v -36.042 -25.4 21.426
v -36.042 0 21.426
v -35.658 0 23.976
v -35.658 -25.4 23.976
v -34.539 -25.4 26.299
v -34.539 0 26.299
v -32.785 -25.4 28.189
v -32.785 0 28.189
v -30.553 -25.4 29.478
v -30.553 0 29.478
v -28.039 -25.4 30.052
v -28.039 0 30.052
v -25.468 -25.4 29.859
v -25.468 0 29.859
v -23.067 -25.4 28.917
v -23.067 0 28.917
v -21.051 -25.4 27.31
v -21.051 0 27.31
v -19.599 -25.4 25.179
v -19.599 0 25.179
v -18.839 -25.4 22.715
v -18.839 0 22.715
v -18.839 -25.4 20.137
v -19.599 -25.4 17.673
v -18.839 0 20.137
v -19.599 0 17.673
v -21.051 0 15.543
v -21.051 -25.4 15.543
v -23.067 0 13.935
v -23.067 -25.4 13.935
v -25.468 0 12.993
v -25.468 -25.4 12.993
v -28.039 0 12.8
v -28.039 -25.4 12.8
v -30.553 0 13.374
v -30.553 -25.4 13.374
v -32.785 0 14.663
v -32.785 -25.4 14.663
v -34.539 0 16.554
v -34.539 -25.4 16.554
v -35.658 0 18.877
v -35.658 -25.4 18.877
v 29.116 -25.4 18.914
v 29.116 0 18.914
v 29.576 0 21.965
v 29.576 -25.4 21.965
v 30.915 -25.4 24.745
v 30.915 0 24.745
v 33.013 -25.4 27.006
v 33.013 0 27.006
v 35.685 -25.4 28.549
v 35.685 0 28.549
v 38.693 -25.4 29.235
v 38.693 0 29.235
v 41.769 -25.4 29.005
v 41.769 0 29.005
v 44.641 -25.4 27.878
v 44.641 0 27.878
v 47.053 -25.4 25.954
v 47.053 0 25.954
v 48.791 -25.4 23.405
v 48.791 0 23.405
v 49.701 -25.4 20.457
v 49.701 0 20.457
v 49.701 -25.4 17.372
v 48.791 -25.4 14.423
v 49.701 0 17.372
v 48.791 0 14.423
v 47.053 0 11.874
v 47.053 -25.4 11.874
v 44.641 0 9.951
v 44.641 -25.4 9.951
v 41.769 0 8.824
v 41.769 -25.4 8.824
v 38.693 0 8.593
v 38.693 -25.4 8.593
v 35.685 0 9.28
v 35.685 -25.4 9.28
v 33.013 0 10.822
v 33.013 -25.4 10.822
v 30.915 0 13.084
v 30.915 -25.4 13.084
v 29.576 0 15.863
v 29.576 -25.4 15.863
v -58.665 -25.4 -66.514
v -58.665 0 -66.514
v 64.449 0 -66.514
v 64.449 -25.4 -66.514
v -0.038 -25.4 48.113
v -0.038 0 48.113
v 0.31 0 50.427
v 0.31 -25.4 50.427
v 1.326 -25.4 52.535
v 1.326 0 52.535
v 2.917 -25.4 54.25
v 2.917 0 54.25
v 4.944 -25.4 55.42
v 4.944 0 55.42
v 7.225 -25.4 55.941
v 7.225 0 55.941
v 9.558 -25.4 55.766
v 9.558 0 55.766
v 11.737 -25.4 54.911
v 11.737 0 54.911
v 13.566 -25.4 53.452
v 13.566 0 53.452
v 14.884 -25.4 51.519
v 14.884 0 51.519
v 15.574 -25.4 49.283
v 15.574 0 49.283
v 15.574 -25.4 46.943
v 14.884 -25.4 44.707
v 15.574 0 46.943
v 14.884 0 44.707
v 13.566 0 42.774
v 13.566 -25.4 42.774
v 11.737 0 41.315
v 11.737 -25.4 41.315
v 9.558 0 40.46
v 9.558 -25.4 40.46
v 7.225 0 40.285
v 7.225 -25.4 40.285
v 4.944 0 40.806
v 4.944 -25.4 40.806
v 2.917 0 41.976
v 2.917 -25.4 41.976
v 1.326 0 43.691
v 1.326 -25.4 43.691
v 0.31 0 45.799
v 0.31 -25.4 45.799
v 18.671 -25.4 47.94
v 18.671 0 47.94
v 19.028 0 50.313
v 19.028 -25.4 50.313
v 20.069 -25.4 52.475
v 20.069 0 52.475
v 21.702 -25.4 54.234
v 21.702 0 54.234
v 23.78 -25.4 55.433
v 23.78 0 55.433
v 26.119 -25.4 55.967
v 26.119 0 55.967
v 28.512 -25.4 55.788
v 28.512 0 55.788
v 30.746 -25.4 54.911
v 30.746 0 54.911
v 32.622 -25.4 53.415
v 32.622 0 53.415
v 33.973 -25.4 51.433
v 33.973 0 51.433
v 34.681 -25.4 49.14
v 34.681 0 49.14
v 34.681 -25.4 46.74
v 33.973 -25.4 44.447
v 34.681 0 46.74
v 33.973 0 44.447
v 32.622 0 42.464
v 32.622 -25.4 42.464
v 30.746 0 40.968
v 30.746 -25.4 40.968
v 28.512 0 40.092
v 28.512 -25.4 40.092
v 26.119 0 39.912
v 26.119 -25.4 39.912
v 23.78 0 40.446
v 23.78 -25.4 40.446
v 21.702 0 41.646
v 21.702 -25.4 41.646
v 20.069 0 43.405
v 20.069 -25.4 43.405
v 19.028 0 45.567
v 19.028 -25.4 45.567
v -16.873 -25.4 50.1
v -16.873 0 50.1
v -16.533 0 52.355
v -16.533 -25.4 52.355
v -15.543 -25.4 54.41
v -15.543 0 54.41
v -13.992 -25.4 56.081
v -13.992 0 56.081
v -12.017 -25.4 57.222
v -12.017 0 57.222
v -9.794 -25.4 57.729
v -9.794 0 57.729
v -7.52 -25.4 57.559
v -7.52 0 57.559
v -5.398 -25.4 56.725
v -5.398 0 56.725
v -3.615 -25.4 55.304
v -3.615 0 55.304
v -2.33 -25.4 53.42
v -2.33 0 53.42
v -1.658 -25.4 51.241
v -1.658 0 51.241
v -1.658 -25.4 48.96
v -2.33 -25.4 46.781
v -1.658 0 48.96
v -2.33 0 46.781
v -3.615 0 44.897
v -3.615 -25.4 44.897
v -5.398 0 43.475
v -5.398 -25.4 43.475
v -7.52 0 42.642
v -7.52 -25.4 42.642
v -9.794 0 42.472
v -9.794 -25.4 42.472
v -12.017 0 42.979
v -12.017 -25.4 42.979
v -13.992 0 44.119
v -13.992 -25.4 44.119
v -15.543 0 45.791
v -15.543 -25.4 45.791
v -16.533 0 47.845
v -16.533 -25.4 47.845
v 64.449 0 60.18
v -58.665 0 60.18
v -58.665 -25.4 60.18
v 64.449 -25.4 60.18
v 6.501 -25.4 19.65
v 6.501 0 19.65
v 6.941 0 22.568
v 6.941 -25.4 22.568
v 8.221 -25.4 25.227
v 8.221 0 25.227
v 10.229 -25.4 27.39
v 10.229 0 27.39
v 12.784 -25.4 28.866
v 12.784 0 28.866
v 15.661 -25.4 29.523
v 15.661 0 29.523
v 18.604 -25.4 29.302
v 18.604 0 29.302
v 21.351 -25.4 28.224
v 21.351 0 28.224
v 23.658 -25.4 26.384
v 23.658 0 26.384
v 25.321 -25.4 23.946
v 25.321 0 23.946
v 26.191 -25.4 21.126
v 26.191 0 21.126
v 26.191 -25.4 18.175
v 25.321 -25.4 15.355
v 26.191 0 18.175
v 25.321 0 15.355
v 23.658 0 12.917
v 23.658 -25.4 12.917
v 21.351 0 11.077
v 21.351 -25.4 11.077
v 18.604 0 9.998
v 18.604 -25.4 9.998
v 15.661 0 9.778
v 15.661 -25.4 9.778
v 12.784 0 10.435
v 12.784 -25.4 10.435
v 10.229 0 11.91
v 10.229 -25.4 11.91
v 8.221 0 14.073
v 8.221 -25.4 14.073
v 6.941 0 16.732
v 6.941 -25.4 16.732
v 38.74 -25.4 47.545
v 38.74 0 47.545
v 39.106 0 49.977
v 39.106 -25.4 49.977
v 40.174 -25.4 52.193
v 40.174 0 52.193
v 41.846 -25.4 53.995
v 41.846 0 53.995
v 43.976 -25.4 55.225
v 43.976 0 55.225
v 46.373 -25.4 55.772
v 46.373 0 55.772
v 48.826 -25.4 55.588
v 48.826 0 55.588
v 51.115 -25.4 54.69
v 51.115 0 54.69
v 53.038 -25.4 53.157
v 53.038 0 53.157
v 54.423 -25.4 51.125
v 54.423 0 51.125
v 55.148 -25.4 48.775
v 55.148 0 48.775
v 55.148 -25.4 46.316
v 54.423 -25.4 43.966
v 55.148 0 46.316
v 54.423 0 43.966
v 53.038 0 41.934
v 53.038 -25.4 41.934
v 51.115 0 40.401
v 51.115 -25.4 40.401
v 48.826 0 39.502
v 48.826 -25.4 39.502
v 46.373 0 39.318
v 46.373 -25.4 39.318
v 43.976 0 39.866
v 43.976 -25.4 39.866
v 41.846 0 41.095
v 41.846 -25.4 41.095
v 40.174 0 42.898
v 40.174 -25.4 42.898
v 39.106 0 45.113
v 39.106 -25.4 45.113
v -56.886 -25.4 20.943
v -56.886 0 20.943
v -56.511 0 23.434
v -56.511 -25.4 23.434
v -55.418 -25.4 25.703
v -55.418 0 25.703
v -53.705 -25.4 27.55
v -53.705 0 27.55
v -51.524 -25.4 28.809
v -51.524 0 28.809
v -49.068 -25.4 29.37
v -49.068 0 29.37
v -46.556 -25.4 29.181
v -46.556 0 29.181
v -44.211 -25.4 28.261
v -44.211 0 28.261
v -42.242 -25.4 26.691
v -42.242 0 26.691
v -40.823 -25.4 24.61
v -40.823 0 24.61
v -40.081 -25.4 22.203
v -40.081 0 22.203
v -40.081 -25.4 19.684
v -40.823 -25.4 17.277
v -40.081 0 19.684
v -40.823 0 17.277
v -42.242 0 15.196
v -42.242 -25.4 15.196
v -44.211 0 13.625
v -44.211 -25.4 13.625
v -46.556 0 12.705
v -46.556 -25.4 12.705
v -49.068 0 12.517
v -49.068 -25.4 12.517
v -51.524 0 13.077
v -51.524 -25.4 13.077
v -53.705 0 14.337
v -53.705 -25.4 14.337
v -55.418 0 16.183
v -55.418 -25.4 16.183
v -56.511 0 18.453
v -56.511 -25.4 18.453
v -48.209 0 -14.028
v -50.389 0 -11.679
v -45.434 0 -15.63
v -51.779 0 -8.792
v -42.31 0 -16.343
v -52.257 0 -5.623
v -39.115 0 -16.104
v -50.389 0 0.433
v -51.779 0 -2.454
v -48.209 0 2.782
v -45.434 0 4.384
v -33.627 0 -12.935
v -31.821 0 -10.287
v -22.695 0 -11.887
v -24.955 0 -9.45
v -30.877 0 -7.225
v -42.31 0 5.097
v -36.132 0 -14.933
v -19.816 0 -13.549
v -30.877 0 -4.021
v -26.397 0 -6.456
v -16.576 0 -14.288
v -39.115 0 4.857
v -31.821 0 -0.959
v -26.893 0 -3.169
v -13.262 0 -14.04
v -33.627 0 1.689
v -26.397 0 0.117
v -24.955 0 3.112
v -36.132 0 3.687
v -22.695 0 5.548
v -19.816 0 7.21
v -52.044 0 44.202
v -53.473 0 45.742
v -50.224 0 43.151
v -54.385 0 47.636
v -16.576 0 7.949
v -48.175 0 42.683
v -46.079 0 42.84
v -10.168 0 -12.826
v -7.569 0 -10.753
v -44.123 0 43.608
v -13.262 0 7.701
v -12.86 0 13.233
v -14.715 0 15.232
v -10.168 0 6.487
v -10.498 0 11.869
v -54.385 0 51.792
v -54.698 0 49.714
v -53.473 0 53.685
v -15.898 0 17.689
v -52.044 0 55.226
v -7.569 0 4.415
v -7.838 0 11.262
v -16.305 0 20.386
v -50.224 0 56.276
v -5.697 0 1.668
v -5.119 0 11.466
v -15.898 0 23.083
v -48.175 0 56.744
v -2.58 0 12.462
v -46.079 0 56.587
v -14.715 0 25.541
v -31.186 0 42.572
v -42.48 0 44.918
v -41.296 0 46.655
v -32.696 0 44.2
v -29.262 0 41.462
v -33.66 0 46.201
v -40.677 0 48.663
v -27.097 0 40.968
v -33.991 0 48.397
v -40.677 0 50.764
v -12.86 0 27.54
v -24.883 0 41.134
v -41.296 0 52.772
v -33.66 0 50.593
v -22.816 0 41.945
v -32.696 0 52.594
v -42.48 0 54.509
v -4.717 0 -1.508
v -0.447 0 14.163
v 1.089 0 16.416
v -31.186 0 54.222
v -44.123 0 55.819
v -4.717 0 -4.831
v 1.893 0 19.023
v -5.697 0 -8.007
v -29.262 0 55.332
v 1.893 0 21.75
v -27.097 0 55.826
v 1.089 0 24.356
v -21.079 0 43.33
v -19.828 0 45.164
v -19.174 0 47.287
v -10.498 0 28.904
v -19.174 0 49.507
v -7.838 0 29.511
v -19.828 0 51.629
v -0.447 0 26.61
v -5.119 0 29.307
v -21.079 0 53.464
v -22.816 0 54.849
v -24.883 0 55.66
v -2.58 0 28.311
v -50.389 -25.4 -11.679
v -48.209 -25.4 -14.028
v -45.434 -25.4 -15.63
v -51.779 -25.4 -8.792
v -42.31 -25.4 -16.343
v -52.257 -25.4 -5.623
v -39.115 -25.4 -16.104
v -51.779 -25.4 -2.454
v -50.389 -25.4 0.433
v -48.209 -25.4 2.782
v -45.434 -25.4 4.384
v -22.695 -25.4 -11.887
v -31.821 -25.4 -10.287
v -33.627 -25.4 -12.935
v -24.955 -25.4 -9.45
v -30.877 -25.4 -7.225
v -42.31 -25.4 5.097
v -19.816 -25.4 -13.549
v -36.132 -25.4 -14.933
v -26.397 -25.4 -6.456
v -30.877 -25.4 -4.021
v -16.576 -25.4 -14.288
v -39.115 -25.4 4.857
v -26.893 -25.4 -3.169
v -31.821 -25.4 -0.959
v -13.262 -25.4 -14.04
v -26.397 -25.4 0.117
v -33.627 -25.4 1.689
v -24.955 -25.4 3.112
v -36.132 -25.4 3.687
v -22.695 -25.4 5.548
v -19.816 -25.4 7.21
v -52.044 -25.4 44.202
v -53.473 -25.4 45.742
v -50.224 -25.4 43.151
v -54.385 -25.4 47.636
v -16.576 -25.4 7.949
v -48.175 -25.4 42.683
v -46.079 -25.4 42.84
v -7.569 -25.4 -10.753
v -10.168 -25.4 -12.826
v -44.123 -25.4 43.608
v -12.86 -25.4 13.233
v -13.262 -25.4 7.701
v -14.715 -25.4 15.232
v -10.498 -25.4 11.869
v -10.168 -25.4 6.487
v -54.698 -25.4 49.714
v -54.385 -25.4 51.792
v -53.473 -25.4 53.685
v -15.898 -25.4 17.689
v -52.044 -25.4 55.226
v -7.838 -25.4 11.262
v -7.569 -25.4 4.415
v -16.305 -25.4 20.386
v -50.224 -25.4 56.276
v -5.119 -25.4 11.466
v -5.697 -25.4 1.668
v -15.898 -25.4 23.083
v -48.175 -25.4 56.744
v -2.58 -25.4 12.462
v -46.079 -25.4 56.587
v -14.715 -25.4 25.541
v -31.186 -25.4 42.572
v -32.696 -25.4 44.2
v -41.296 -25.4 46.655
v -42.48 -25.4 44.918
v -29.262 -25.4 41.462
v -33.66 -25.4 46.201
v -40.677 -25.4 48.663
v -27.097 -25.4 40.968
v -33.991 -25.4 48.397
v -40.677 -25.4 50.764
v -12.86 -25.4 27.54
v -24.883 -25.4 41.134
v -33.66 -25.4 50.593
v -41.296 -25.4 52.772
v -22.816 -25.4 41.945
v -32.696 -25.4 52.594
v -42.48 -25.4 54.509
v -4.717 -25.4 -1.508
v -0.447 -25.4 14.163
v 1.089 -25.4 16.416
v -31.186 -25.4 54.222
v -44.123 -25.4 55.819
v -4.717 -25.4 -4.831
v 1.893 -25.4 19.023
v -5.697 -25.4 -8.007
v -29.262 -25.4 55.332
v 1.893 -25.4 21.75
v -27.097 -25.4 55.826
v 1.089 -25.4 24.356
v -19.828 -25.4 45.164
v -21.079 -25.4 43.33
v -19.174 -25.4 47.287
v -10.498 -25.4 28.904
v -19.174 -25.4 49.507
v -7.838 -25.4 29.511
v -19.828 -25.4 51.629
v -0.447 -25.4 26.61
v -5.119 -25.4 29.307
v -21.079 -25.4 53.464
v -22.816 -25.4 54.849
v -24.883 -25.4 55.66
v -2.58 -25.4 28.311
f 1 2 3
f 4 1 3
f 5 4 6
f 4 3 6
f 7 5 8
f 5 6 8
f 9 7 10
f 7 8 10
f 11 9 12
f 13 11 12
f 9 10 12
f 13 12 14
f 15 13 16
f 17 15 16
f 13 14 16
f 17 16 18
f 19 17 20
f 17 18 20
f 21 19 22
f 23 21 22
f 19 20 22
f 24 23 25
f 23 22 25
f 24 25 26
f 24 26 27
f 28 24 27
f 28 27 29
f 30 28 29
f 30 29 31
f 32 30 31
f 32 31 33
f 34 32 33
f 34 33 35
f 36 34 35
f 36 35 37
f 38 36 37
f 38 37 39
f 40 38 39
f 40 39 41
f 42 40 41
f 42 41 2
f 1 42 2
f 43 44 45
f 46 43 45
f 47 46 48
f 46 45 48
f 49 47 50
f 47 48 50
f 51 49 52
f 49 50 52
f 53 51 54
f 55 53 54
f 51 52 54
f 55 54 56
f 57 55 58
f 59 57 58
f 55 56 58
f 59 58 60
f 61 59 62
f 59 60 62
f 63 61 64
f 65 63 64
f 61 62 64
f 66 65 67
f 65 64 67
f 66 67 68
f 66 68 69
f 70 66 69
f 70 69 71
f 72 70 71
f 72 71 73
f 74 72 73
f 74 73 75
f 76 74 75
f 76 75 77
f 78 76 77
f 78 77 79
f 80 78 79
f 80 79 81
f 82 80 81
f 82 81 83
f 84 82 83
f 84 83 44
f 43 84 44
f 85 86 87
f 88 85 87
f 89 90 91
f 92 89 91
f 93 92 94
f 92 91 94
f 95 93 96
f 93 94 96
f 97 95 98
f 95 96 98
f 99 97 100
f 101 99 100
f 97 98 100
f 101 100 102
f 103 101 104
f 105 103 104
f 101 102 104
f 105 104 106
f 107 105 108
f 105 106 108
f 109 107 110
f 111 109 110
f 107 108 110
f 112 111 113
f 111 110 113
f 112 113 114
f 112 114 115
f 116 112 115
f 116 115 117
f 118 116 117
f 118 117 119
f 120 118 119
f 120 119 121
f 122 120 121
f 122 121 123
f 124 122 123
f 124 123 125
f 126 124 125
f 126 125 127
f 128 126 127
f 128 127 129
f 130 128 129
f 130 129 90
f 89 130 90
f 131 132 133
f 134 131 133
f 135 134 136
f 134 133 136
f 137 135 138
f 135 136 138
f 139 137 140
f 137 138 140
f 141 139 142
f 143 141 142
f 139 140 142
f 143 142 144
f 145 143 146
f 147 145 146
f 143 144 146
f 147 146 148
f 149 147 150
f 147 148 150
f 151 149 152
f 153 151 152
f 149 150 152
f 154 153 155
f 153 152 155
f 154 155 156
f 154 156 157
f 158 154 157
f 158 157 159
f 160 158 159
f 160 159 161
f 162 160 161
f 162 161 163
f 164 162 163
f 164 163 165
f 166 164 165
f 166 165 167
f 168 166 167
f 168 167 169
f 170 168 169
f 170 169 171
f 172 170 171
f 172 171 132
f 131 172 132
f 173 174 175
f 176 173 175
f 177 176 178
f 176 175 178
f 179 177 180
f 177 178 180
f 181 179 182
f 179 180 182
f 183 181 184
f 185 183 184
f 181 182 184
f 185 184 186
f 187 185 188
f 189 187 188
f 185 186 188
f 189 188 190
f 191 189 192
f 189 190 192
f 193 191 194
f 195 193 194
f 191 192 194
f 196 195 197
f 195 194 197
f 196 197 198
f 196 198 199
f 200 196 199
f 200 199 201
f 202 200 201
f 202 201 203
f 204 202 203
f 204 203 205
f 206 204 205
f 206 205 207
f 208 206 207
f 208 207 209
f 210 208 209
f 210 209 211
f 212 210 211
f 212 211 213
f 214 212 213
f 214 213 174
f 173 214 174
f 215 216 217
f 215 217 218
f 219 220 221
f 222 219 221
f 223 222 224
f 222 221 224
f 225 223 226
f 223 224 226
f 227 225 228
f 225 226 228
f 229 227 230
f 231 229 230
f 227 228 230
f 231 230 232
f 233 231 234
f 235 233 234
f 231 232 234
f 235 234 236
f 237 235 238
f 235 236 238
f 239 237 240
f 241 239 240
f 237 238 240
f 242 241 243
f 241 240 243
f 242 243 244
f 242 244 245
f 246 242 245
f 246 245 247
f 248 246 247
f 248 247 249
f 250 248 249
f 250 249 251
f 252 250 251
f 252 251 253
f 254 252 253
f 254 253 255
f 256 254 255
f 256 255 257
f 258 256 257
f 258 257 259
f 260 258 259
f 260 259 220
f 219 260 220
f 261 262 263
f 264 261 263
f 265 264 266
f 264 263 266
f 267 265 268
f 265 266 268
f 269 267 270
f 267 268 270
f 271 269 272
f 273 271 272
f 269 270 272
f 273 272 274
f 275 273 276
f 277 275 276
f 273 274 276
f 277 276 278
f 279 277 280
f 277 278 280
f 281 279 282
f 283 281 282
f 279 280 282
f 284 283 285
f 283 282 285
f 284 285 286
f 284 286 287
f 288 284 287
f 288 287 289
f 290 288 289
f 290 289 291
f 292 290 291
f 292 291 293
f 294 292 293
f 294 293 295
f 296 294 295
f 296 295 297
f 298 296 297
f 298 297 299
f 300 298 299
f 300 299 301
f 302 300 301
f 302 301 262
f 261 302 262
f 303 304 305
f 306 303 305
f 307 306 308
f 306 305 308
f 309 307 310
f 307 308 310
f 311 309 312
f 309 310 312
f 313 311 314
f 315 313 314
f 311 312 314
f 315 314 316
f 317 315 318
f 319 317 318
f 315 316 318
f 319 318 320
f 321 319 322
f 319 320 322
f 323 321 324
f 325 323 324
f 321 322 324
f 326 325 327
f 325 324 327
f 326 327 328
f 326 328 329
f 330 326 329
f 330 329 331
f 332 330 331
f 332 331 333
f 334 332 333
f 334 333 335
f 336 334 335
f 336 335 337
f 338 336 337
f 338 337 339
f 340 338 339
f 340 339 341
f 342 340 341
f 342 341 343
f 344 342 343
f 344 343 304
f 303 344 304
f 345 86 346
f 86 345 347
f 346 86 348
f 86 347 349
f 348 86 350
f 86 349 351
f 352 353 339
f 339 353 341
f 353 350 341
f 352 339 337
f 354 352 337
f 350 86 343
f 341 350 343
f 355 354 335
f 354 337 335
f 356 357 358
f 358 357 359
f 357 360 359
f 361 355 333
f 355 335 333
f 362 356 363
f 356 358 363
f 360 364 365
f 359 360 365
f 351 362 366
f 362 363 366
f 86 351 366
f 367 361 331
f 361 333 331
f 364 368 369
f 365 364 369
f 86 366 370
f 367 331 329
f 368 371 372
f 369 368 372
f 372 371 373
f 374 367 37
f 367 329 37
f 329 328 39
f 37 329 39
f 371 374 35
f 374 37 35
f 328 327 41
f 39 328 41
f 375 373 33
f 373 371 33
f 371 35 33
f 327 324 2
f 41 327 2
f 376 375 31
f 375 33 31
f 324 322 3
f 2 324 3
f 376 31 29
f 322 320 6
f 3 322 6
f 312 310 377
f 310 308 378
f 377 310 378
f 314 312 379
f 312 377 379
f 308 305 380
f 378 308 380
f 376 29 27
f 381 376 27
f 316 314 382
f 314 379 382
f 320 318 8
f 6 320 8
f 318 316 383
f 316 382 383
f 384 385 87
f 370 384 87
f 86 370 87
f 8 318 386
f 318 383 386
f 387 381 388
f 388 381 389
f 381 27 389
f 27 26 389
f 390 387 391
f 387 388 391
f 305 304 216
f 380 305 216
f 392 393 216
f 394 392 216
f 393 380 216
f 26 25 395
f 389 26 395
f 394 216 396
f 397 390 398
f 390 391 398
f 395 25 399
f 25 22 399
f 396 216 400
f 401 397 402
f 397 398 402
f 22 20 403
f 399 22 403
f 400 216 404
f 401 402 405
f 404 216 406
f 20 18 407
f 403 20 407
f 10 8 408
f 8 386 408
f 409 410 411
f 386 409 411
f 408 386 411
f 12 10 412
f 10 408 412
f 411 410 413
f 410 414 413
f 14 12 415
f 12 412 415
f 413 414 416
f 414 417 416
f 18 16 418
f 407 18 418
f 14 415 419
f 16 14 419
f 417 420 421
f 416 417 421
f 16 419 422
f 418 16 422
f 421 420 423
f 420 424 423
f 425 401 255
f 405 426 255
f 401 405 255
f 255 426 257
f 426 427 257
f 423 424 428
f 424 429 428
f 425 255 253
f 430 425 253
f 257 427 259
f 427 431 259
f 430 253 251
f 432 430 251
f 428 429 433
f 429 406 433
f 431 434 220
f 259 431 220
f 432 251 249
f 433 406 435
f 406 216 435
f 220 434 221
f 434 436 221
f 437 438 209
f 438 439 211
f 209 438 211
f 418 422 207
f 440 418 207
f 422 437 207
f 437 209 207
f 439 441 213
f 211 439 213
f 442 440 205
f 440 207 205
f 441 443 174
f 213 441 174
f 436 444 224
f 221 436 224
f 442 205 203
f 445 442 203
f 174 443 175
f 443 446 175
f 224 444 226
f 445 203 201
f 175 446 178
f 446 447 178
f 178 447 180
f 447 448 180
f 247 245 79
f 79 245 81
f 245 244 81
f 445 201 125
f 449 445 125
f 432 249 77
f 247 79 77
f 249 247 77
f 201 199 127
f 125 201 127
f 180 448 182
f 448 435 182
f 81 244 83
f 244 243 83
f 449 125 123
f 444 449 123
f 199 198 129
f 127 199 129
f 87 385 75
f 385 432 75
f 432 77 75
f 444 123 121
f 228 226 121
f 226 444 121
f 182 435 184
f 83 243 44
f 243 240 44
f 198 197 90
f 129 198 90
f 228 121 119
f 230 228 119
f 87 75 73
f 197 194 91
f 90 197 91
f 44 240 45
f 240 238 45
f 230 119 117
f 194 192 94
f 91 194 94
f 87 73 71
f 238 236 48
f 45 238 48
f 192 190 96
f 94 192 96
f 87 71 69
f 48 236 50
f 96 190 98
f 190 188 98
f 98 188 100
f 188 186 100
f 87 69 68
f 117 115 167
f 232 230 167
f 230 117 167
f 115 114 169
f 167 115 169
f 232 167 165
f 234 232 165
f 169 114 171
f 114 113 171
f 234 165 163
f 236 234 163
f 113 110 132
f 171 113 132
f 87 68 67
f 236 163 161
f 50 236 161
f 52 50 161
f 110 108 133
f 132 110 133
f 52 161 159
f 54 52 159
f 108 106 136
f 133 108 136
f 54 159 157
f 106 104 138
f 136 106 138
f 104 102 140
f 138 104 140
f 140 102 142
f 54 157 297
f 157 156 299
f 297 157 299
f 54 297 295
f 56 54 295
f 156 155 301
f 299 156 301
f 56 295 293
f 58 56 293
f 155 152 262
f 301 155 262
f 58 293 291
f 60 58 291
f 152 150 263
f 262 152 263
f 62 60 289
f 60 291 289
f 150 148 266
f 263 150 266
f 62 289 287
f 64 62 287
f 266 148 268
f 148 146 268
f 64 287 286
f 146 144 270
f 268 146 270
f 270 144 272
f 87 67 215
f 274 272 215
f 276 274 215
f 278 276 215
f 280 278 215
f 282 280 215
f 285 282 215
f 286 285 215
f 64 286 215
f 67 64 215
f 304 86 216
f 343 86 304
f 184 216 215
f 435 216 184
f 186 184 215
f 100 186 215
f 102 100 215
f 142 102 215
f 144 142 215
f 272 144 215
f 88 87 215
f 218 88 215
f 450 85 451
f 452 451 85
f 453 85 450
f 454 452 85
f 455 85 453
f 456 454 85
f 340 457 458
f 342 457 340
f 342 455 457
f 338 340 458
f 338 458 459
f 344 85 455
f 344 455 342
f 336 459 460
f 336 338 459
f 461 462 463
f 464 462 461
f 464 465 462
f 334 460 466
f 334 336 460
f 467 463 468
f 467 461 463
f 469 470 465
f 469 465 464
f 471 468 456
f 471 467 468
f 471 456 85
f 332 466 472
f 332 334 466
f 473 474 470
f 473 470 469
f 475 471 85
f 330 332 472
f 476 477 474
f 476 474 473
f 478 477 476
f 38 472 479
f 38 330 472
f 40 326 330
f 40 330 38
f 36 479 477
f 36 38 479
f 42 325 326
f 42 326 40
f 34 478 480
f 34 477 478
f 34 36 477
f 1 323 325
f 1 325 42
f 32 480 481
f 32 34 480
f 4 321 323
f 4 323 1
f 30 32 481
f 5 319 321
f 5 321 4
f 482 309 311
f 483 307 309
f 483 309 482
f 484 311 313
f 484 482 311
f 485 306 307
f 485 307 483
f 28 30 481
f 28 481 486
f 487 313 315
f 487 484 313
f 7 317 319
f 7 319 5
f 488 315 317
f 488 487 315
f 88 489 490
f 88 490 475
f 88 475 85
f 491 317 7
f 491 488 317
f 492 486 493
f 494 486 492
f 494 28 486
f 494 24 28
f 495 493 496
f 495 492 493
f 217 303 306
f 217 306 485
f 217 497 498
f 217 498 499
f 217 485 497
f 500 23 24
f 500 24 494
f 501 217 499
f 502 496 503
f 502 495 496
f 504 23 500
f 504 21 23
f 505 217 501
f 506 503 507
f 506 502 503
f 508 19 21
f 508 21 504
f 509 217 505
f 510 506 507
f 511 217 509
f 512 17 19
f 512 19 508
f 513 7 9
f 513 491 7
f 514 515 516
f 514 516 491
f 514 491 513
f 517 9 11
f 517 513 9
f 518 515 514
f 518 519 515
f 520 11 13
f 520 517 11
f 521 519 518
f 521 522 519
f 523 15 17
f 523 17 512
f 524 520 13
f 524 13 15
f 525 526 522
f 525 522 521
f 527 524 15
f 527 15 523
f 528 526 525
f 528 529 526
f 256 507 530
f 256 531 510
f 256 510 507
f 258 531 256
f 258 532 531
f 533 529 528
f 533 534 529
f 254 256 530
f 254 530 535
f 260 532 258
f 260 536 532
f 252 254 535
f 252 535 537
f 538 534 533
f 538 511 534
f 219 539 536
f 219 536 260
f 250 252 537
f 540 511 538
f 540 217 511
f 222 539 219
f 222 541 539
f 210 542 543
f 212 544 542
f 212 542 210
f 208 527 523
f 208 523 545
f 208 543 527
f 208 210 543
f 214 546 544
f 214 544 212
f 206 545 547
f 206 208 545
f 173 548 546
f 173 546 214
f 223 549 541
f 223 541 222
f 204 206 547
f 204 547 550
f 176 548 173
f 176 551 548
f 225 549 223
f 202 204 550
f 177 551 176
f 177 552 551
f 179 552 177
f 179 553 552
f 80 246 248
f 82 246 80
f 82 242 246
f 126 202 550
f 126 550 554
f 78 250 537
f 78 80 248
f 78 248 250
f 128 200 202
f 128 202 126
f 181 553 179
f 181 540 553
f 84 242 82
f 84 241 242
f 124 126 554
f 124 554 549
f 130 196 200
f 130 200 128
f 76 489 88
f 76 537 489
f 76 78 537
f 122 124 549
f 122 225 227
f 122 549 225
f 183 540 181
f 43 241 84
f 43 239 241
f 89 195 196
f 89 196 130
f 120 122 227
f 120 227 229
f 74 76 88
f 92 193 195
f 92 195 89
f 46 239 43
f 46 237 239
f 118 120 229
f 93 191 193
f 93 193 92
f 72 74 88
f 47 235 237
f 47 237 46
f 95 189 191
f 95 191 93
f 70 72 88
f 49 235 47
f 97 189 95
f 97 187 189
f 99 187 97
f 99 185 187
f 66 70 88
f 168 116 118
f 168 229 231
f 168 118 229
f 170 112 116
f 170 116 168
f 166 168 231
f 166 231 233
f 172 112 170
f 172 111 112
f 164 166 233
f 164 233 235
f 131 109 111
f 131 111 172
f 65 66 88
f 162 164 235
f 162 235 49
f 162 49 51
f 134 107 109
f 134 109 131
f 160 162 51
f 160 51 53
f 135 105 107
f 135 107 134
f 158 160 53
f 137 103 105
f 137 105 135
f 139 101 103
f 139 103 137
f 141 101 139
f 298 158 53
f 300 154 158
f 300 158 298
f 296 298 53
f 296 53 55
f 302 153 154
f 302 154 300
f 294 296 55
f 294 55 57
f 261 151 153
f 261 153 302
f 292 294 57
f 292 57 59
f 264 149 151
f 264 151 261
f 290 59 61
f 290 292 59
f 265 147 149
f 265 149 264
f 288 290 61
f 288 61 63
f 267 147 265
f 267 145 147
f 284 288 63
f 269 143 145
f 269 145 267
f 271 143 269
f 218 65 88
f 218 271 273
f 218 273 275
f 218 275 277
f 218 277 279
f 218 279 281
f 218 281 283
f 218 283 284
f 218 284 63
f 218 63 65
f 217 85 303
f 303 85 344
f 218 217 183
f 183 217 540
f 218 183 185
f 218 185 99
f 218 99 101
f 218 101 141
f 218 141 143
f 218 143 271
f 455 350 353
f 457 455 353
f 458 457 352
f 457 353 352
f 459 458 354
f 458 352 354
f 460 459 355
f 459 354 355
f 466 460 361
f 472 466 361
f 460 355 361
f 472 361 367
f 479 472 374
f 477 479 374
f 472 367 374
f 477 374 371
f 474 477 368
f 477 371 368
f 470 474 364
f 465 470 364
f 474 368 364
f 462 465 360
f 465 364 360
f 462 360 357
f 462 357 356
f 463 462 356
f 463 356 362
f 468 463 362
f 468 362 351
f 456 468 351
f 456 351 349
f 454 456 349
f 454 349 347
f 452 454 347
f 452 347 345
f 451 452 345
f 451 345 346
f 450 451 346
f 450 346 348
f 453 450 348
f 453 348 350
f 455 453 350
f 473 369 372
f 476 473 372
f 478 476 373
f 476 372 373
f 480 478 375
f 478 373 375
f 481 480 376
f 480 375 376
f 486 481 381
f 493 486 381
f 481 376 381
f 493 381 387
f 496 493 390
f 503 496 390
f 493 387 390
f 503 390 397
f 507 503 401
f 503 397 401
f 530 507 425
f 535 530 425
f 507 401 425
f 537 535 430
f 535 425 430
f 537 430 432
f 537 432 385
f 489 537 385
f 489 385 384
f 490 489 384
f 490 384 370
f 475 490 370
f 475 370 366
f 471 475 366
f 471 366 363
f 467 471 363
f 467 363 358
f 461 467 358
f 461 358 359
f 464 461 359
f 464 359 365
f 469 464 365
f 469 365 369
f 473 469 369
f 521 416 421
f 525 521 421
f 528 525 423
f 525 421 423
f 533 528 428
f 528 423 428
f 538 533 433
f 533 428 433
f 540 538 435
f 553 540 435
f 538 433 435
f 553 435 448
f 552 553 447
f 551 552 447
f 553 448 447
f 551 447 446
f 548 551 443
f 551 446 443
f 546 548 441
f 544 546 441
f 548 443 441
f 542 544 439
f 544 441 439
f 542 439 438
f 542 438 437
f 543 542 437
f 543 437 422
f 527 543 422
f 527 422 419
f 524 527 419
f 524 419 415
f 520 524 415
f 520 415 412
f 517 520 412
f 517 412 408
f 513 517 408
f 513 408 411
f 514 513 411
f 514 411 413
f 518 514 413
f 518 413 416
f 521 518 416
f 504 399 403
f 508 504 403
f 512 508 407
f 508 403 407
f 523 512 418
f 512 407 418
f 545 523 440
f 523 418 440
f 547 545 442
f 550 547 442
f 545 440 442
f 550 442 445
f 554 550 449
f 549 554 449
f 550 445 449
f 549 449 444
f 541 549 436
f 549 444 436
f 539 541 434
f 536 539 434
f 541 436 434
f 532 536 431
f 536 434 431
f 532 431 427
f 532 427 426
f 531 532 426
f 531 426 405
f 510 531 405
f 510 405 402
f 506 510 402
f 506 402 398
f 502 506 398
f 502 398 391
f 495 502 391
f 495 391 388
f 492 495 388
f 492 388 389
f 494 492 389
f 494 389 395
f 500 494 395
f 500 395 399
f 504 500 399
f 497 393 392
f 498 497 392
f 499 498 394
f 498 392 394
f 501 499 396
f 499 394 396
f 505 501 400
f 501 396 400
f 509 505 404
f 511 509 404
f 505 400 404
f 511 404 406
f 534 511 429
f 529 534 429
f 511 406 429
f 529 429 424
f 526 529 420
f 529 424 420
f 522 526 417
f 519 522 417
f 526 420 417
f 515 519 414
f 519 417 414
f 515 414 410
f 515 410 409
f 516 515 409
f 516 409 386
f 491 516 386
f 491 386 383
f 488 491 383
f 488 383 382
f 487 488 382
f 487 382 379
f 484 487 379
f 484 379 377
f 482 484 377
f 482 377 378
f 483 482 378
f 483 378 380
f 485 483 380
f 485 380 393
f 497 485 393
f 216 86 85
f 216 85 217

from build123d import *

# Parameters (mm, degrees)
F0_W     = 123.113498
F0_H     = 126.693976
F1_DEPTH = 25.4
F3_D     = 14.1
F4_D     = 14.9
F5_D     = 15.3
F6_D     = 15.7
F7_D     = 16.1
F8_D     = 16.5
F9_D     = 16.9
F10_D    = 17.3
F11_D    = 18.3
F12_D    = 19.8
F13_D    = 20.7
F14_D    = 21.5
F15_D    = 22.3


with BuildPart() as f1:
    # F0 (on Front) → F1 (new body)
    with BuildSketch(Plane.XZ):
        with Locations((2.891928, -3.167348)):
            Rectangle(F0_W, F0_H)
    extrude(amount=F1_DEPTH)

    # F3 (through all)
    with Locations(Plane.XZ.offset(25.4)):
        with Locations((-47.647953, 49.713619)):
            Hole(F3_D / 2)

    # F4 (through all)
    with Locations(Plane.XZ.offset(25.4)):
        with Locations((-26.540603, 48.396926)):
            Hole(F4_D / 2)

    # F5 (through all)
    with Locations(Plane.XZ.offset(25.4)):
        with Locations((-9.222592, 50.100338)):
            Hole(F5_D / 2)

    # F6 (through all)
    with Locations(Plane.XZ.offset(25.4)):
        with Locations((7.811517, 48.113026)):
            Hole(F6_D / 2)

    # F7 (through all)
    with Locations(Plane.XZ.offset(25.4)):
        with Locations((26.720595, 47.939809)):
            Hole(F7_D / 2)

    # F8 (through all)
    with Locations(Plane.XZ.offset(25.4)):
        with Locations((46.989974, 47.545221)):
            Hole(F8_D / 2)

    # F9 (through all)
    with Locations(Plane.XZ.offset(25.4)):
        with Locations((-48.436428, 20.943279)):
            Hole(F9_D / 2)

    # F10 (through all)
    with Locations(Plane.XZ.offset(25.4)):
        with Locations((-27.392309, 21.426253)):
            Hole(F10_D / 2)

    # F11 (through all)
    with Locations(Plane.XZ.offset(25.4)):
        with Locations((-7.154659, 20.386403)):
            Hole(F11_D / 2)

    # F12 (through all)
    with Locations(Plane.XZ.offset(25.4)):
        with Locations((16.401133, 19.650284)):
            Hole(F12_D / 2)

    # F13 (through all)
    with Locations(Plane.XZ.offset(25.4)):
        with Locations((39.46618, 18.914167)):
            Hole(F13_D / 2)

    # F14 (through all)
    with Locations(Plane.XZ.offset(25.4)):
        with Locations((-41.506853, -5.623117)):
            Hole(F14_D / 2)

    # F15 (through all)
    with Locations(Plane.XZ.offset(25.4)):
        with Locations((-15.742708, -3.169389)):
            Hole(F15_D / 2)


solid = f1.part
